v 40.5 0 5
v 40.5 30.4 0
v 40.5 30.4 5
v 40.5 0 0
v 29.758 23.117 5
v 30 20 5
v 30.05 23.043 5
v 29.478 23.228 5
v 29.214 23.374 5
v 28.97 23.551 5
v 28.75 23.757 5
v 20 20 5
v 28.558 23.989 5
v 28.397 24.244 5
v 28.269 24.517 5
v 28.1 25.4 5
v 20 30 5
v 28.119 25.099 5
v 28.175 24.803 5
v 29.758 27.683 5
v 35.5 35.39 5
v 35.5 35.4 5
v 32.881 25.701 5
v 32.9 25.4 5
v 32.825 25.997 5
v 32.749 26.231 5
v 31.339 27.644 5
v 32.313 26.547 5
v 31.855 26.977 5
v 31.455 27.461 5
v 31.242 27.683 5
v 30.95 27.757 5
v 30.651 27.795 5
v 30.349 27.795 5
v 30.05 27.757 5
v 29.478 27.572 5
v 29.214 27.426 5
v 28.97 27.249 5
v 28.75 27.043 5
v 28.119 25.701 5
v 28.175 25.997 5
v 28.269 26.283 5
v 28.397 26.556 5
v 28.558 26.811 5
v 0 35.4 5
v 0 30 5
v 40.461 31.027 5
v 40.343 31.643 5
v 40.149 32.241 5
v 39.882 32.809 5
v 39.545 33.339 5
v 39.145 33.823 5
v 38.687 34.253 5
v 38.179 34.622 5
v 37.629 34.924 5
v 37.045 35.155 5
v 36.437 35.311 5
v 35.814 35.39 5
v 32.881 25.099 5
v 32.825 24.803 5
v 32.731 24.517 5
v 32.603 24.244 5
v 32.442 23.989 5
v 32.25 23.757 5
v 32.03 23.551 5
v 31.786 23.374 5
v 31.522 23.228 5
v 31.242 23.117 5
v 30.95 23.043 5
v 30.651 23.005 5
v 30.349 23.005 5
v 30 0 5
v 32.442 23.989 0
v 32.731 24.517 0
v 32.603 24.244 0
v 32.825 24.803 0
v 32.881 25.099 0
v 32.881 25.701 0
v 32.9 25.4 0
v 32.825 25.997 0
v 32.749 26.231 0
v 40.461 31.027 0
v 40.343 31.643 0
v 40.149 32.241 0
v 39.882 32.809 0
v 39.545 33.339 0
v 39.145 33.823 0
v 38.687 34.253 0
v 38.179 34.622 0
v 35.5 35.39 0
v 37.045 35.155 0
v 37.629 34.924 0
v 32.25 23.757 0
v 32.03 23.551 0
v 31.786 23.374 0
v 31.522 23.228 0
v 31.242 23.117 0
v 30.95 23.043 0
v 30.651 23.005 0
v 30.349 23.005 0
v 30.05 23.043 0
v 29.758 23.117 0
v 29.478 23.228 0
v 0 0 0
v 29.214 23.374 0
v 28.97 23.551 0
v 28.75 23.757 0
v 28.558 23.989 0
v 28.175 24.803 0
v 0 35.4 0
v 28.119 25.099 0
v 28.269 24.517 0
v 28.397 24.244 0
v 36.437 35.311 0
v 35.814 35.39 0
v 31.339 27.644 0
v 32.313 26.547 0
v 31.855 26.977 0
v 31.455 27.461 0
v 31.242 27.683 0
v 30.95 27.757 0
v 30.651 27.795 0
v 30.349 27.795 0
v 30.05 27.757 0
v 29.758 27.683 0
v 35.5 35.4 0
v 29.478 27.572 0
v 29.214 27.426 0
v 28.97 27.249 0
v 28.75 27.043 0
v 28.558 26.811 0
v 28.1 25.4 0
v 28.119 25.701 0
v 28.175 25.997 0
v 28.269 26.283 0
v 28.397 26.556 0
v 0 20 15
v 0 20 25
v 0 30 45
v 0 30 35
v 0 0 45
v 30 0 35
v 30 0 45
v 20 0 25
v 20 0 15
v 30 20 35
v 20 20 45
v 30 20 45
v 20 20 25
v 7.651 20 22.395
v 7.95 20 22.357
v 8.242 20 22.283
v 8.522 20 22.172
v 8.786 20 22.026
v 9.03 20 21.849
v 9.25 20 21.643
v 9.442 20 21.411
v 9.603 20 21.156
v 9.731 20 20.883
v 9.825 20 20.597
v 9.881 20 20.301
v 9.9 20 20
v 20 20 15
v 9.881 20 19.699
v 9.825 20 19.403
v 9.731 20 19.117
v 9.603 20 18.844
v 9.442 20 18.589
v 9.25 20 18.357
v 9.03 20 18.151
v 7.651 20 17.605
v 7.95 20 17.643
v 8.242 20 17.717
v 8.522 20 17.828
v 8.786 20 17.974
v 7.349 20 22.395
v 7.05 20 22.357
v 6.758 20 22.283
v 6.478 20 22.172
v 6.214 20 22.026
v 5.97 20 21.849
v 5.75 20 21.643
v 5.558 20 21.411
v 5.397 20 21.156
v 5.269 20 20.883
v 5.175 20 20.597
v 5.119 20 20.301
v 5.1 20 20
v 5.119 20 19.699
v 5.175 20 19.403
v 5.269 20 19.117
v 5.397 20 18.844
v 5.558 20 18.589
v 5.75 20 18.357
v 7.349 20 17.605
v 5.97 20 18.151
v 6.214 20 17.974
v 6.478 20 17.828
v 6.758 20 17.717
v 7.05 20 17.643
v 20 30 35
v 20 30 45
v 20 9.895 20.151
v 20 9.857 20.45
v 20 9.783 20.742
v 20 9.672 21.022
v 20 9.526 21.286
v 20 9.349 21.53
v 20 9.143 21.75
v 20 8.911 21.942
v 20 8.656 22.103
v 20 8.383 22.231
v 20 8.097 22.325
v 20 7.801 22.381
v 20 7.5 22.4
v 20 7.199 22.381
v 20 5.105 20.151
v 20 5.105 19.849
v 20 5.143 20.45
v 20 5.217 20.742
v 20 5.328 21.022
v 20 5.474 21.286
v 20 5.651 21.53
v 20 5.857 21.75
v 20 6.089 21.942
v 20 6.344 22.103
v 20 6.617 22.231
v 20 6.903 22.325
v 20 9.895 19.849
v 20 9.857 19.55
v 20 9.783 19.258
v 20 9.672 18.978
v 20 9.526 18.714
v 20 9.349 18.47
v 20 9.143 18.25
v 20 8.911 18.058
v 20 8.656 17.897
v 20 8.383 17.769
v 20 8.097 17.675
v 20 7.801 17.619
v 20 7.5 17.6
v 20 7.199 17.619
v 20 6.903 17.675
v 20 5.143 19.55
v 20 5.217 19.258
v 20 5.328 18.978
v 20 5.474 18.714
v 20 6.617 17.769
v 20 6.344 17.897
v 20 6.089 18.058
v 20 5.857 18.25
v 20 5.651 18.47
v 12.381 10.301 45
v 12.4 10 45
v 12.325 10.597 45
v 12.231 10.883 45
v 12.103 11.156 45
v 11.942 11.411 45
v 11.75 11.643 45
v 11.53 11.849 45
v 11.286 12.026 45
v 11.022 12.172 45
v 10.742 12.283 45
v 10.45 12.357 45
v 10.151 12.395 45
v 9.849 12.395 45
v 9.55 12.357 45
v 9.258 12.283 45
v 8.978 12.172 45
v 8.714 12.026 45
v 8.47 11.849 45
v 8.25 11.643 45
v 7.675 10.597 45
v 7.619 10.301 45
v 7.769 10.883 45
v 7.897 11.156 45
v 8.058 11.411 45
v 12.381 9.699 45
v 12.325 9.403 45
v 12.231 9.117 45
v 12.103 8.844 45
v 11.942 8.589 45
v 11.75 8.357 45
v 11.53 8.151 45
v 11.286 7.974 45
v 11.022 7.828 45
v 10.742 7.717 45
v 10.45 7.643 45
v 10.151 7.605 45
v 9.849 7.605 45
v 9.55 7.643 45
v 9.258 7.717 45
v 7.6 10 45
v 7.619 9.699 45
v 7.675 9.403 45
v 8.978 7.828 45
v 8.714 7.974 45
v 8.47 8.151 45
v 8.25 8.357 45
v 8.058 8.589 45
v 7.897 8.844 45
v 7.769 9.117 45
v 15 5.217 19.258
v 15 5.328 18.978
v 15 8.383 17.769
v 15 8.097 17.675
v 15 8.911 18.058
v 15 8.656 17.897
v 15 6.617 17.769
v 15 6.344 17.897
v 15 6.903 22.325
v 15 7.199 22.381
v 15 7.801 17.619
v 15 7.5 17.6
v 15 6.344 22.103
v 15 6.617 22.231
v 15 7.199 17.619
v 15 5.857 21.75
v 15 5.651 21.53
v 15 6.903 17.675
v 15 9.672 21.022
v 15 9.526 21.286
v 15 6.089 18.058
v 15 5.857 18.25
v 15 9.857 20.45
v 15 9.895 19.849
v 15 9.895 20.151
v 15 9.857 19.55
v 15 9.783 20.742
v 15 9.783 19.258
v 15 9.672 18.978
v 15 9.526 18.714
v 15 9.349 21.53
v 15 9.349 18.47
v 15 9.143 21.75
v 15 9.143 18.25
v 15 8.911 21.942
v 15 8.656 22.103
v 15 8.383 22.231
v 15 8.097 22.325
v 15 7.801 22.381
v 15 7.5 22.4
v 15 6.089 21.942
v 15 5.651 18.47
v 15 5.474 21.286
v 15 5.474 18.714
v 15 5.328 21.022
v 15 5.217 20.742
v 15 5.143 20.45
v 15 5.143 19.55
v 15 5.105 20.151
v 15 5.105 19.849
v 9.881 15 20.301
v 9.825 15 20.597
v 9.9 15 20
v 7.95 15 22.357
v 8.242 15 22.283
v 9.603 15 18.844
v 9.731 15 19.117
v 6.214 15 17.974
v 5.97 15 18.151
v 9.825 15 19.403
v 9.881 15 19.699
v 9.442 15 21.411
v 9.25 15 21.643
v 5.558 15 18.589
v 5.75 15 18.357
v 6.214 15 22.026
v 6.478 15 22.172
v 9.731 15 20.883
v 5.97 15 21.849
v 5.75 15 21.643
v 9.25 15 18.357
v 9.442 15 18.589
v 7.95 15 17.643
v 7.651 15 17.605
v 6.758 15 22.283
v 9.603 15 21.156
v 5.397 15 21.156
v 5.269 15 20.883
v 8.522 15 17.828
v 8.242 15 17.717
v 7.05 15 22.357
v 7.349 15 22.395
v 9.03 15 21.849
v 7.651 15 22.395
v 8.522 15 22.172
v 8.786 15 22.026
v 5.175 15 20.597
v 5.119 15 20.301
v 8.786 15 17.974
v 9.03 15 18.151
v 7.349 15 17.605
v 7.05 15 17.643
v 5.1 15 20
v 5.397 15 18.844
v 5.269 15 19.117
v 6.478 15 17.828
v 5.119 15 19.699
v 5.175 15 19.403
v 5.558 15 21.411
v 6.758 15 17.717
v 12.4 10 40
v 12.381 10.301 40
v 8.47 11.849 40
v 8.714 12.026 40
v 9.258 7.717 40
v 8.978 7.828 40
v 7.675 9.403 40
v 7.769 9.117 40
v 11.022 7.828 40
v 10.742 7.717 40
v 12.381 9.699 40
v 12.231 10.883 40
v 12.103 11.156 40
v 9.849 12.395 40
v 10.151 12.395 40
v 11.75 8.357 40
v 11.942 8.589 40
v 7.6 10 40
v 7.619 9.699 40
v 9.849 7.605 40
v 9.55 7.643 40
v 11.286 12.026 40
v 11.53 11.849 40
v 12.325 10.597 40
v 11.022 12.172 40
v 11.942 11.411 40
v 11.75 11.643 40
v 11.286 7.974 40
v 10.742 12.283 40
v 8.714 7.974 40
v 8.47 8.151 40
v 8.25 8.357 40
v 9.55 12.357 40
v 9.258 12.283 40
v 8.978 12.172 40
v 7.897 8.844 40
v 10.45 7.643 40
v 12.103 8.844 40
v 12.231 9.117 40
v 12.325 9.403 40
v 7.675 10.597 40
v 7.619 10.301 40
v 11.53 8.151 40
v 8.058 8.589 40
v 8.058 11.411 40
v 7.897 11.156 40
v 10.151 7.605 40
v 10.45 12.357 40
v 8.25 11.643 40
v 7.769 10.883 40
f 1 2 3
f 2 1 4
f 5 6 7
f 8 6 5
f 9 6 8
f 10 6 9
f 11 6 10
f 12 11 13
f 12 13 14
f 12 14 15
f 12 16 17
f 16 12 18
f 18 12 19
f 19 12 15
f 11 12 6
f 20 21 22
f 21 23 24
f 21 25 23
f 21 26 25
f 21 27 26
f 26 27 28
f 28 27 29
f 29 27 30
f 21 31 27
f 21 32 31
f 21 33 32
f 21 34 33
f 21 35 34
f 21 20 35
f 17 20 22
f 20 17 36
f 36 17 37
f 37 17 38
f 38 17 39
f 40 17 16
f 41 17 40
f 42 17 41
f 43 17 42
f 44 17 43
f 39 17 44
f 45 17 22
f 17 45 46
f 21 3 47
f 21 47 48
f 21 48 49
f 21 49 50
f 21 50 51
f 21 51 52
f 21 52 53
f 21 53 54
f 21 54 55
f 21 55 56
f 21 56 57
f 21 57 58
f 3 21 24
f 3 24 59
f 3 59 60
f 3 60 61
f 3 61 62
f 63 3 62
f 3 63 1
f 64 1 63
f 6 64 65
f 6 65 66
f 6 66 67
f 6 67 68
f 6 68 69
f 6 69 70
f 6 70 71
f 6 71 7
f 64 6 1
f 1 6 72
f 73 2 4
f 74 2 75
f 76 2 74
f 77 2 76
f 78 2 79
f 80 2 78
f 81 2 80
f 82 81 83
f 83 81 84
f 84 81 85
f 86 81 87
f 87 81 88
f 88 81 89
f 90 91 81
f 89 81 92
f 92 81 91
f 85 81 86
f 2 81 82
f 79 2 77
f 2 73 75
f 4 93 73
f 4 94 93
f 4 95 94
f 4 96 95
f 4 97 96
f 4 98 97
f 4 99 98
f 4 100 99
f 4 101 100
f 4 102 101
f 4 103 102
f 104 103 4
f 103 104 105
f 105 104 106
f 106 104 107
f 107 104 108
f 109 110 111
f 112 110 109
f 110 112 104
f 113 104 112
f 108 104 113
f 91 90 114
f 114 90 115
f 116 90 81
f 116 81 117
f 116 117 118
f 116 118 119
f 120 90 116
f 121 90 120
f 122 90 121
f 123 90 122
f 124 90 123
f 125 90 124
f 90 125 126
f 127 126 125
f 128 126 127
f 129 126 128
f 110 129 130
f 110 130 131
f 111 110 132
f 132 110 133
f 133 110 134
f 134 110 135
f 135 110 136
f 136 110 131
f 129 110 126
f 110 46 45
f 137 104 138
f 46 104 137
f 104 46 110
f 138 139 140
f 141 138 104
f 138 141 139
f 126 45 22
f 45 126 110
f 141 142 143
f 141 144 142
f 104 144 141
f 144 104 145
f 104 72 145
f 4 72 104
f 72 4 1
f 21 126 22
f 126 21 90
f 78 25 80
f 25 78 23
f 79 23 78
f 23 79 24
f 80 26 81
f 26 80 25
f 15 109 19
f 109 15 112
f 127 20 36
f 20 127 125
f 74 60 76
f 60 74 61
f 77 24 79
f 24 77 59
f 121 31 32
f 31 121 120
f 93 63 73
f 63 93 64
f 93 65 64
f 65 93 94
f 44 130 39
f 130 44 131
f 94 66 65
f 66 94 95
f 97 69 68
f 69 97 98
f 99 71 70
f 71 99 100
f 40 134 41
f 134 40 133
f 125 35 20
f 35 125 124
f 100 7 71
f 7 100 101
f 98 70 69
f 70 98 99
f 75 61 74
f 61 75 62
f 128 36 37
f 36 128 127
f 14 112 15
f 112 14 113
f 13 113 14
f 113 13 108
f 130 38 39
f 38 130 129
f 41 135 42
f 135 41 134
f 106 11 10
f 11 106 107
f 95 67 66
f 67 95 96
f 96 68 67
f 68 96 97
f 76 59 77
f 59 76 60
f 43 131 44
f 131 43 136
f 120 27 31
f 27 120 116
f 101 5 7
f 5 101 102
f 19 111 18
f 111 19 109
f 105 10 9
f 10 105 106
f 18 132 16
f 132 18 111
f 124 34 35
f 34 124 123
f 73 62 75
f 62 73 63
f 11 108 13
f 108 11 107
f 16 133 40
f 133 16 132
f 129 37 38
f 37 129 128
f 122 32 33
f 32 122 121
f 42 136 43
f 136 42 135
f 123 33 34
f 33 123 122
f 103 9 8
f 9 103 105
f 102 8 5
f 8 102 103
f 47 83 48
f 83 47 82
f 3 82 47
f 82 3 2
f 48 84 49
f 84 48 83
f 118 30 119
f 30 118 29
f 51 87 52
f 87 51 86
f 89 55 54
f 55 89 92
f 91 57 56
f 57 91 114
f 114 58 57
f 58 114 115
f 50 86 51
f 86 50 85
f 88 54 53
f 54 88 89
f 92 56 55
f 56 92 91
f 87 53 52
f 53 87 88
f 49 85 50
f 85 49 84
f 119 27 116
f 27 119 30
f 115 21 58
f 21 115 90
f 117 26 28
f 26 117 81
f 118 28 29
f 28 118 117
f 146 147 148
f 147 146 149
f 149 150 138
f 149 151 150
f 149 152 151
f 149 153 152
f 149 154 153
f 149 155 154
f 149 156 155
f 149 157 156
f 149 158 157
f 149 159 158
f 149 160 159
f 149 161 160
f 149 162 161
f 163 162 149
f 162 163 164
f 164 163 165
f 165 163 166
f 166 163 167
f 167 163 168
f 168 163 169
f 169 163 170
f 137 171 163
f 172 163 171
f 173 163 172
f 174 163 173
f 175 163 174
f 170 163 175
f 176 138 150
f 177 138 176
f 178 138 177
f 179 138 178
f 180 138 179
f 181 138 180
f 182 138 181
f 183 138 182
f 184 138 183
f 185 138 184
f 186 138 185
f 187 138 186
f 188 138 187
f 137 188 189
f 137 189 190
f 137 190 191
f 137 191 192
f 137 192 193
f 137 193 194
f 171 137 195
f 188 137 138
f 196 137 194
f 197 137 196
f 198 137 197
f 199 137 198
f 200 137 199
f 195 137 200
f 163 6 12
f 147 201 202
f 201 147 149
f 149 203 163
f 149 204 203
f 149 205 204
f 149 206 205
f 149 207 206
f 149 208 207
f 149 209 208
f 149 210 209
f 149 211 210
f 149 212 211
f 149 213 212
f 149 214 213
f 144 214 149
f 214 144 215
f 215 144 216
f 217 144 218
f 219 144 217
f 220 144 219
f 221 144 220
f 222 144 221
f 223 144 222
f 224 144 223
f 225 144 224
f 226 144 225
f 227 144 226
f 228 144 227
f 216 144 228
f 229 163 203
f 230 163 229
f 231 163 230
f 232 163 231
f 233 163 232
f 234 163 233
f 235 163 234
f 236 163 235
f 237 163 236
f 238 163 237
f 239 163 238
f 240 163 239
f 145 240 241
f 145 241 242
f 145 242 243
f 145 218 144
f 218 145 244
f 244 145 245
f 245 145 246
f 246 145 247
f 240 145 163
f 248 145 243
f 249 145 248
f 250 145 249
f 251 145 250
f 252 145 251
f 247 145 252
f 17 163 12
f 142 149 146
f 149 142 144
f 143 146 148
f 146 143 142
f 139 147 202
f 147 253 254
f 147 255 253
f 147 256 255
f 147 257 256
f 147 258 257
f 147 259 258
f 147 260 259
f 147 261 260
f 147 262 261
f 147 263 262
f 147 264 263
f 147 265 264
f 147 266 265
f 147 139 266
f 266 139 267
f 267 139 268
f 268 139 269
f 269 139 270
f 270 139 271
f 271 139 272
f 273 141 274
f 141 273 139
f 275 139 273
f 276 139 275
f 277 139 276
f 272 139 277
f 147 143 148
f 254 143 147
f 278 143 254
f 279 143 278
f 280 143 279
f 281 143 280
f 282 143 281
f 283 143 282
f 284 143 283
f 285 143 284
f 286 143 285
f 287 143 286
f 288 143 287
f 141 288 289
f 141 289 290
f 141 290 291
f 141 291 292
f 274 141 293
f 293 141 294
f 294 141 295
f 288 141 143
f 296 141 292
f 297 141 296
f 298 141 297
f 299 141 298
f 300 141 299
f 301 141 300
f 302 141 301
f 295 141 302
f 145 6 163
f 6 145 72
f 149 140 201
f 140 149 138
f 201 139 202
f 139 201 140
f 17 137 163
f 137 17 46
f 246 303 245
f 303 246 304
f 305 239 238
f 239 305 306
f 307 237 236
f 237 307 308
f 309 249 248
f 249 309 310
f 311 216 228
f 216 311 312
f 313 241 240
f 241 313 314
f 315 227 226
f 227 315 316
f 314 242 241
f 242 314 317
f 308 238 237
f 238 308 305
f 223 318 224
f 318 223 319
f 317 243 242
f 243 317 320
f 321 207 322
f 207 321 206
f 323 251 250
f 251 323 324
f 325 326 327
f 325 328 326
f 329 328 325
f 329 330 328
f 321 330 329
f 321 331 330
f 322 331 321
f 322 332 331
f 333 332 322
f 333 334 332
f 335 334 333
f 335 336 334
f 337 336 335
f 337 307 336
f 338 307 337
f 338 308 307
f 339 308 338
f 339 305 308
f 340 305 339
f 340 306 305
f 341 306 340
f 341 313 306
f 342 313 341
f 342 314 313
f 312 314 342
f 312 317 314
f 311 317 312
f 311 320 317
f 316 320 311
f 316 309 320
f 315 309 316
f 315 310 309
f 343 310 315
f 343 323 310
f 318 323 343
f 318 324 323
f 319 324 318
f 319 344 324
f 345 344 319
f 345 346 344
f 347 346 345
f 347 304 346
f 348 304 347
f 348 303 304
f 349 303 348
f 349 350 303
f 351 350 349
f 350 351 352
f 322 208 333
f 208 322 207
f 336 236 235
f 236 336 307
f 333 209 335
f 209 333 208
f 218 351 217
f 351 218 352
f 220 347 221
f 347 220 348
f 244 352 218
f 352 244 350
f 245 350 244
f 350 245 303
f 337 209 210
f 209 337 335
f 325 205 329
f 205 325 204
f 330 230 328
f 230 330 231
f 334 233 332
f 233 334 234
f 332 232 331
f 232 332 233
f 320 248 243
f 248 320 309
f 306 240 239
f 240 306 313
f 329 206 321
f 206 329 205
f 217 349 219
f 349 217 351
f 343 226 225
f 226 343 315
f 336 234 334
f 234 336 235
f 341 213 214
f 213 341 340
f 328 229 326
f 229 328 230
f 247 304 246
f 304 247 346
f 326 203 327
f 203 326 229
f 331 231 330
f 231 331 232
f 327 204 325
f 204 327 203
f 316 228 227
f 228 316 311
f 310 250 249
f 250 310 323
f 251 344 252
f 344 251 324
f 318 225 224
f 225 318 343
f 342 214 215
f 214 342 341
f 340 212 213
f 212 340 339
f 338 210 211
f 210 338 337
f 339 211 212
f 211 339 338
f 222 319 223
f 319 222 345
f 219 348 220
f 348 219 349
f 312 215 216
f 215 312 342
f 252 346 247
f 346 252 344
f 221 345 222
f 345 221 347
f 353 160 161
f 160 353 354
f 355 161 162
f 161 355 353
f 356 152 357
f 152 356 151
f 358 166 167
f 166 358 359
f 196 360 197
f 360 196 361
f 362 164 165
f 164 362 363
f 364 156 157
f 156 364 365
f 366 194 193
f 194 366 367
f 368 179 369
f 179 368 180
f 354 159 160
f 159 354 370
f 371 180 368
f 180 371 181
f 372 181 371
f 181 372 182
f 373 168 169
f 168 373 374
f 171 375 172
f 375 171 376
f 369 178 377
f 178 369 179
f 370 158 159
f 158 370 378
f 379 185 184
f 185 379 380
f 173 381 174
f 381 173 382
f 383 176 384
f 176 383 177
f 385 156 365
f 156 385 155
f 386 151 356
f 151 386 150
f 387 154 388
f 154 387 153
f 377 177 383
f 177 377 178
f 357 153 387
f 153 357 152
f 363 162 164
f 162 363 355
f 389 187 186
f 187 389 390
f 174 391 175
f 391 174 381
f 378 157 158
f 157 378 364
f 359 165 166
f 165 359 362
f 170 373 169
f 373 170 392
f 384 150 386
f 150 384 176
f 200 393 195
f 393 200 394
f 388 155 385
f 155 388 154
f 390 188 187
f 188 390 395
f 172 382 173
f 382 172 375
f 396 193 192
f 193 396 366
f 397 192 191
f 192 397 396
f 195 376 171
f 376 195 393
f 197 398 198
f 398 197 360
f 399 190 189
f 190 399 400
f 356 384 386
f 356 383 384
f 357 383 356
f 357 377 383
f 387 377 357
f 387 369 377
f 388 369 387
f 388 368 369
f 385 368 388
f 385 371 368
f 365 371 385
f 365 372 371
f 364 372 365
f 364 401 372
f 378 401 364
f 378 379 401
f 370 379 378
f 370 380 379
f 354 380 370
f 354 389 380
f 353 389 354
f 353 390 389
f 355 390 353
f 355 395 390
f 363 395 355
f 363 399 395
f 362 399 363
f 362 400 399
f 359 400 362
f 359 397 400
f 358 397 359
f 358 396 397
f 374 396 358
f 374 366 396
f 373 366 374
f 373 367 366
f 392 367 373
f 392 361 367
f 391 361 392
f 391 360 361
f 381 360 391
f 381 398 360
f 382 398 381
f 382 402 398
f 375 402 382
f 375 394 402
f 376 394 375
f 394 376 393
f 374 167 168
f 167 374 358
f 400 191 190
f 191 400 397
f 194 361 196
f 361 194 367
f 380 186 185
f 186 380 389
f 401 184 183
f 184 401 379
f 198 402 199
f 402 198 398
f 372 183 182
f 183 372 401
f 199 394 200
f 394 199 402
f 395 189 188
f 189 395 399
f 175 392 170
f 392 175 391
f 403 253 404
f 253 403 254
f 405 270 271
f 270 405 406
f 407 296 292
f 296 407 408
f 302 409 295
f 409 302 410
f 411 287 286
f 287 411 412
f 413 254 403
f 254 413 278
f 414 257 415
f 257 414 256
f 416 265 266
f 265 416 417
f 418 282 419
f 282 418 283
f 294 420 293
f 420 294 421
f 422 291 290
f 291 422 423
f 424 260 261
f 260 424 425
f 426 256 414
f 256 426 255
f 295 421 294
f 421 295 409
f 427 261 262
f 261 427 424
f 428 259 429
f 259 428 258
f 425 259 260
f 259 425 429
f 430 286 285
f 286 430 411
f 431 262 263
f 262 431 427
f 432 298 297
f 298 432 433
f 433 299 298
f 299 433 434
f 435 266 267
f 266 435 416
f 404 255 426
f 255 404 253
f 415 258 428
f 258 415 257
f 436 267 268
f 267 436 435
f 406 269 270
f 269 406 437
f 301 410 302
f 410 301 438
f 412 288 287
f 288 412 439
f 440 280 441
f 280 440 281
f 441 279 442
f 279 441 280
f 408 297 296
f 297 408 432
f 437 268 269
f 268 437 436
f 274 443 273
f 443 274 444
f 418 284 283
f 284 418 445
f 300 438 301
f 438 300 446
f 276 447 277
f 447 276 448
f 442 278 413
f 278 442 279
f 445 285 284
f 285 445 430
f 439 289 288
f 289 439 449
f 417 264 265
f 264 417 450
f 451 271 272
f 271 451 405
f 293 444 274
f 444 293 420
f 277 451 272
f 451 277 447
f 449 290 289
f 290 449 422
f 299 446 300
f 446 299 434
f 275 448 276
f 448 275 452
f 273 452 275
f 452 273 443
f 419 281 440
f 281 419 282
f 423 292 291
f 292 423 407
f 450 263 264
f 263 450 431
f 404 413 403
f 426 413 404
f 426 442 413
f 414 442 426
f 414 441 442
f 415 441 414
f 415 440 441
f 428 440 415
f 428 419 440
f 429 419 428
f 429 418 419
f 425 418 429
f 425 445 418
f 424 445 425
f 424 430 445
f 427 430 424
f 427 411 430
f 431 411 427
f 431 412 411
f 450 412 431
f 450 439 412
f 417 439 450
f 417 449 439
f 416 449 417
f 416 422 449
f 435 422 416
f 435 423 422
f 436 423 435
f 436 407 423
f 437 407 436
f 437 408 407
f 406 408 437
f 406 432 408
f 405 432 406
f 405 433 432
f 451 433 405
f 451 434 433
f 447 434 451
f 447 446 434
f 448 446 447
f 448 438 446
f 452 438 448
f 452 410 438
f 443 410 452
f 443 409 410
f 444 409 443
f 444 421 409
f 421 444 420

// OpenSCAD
holeX = 30.5;
holeY = 25.4;
Threaded_insert_width=4.8;
Threaded_insert_height=5;

module threadedInsert() {
    cylinder(h=Threaded_insert_height, d=Threaded_insert_width, $fn=50);
}

module basePlate() {
    union() {
        difference() {
            cube([holeX+10, holeY+10, Threaded_insert_height]);
            translate([holeX+5,holeY+5,0]) cube([5,5,Threaded_insert_height]);
            translate([holeX, holeY, 0]) threadedInsert();
        }
        translate([holeX+5,holeY+5,0]) cylinder(h=5, r=5, $fn=50);
    }
}

module baseColumn() {
    points = [
        [0,0],
        [30,0],
        [20,10],
        [20,20],
        [30,30],
        [30,40],
        [0,40],
    ];
    rotate([90,0,0]) linear_extrude(20) polygon(points);
    
    /*
    difference() {
        union() {
            cube([20,20,40]);
            cube([holeX+10,20,10]);
            translate([0,0,40-15]) cube([holeX+10,20,15]);
        }
        translate([10,10,40-Threaded_insert_height]) cylinder(h=Threaded_insert_height, d=Threaded_insert_width, $fn=50);
    }
    */
}

module column () {
    difference() {
        union() {
            translate([0,20,0]) baseColumn();
            rotate([0,0,90]) baseColumn();
            
        }
        translate([20-Threaded_insert_height,7.5,15]) rotate([0,90,0]) threadedInsert();
        translate([7.5, 25-Threaded_insert_height,15]) rotate([90,0,0]) threadedInsert();
        translate([10,10,40-Threaded_insert_height]) threadedInsert();
    }
}

union() {
    basePlate();
    translate([0,0,Threaded_insert_height]) column();
}
